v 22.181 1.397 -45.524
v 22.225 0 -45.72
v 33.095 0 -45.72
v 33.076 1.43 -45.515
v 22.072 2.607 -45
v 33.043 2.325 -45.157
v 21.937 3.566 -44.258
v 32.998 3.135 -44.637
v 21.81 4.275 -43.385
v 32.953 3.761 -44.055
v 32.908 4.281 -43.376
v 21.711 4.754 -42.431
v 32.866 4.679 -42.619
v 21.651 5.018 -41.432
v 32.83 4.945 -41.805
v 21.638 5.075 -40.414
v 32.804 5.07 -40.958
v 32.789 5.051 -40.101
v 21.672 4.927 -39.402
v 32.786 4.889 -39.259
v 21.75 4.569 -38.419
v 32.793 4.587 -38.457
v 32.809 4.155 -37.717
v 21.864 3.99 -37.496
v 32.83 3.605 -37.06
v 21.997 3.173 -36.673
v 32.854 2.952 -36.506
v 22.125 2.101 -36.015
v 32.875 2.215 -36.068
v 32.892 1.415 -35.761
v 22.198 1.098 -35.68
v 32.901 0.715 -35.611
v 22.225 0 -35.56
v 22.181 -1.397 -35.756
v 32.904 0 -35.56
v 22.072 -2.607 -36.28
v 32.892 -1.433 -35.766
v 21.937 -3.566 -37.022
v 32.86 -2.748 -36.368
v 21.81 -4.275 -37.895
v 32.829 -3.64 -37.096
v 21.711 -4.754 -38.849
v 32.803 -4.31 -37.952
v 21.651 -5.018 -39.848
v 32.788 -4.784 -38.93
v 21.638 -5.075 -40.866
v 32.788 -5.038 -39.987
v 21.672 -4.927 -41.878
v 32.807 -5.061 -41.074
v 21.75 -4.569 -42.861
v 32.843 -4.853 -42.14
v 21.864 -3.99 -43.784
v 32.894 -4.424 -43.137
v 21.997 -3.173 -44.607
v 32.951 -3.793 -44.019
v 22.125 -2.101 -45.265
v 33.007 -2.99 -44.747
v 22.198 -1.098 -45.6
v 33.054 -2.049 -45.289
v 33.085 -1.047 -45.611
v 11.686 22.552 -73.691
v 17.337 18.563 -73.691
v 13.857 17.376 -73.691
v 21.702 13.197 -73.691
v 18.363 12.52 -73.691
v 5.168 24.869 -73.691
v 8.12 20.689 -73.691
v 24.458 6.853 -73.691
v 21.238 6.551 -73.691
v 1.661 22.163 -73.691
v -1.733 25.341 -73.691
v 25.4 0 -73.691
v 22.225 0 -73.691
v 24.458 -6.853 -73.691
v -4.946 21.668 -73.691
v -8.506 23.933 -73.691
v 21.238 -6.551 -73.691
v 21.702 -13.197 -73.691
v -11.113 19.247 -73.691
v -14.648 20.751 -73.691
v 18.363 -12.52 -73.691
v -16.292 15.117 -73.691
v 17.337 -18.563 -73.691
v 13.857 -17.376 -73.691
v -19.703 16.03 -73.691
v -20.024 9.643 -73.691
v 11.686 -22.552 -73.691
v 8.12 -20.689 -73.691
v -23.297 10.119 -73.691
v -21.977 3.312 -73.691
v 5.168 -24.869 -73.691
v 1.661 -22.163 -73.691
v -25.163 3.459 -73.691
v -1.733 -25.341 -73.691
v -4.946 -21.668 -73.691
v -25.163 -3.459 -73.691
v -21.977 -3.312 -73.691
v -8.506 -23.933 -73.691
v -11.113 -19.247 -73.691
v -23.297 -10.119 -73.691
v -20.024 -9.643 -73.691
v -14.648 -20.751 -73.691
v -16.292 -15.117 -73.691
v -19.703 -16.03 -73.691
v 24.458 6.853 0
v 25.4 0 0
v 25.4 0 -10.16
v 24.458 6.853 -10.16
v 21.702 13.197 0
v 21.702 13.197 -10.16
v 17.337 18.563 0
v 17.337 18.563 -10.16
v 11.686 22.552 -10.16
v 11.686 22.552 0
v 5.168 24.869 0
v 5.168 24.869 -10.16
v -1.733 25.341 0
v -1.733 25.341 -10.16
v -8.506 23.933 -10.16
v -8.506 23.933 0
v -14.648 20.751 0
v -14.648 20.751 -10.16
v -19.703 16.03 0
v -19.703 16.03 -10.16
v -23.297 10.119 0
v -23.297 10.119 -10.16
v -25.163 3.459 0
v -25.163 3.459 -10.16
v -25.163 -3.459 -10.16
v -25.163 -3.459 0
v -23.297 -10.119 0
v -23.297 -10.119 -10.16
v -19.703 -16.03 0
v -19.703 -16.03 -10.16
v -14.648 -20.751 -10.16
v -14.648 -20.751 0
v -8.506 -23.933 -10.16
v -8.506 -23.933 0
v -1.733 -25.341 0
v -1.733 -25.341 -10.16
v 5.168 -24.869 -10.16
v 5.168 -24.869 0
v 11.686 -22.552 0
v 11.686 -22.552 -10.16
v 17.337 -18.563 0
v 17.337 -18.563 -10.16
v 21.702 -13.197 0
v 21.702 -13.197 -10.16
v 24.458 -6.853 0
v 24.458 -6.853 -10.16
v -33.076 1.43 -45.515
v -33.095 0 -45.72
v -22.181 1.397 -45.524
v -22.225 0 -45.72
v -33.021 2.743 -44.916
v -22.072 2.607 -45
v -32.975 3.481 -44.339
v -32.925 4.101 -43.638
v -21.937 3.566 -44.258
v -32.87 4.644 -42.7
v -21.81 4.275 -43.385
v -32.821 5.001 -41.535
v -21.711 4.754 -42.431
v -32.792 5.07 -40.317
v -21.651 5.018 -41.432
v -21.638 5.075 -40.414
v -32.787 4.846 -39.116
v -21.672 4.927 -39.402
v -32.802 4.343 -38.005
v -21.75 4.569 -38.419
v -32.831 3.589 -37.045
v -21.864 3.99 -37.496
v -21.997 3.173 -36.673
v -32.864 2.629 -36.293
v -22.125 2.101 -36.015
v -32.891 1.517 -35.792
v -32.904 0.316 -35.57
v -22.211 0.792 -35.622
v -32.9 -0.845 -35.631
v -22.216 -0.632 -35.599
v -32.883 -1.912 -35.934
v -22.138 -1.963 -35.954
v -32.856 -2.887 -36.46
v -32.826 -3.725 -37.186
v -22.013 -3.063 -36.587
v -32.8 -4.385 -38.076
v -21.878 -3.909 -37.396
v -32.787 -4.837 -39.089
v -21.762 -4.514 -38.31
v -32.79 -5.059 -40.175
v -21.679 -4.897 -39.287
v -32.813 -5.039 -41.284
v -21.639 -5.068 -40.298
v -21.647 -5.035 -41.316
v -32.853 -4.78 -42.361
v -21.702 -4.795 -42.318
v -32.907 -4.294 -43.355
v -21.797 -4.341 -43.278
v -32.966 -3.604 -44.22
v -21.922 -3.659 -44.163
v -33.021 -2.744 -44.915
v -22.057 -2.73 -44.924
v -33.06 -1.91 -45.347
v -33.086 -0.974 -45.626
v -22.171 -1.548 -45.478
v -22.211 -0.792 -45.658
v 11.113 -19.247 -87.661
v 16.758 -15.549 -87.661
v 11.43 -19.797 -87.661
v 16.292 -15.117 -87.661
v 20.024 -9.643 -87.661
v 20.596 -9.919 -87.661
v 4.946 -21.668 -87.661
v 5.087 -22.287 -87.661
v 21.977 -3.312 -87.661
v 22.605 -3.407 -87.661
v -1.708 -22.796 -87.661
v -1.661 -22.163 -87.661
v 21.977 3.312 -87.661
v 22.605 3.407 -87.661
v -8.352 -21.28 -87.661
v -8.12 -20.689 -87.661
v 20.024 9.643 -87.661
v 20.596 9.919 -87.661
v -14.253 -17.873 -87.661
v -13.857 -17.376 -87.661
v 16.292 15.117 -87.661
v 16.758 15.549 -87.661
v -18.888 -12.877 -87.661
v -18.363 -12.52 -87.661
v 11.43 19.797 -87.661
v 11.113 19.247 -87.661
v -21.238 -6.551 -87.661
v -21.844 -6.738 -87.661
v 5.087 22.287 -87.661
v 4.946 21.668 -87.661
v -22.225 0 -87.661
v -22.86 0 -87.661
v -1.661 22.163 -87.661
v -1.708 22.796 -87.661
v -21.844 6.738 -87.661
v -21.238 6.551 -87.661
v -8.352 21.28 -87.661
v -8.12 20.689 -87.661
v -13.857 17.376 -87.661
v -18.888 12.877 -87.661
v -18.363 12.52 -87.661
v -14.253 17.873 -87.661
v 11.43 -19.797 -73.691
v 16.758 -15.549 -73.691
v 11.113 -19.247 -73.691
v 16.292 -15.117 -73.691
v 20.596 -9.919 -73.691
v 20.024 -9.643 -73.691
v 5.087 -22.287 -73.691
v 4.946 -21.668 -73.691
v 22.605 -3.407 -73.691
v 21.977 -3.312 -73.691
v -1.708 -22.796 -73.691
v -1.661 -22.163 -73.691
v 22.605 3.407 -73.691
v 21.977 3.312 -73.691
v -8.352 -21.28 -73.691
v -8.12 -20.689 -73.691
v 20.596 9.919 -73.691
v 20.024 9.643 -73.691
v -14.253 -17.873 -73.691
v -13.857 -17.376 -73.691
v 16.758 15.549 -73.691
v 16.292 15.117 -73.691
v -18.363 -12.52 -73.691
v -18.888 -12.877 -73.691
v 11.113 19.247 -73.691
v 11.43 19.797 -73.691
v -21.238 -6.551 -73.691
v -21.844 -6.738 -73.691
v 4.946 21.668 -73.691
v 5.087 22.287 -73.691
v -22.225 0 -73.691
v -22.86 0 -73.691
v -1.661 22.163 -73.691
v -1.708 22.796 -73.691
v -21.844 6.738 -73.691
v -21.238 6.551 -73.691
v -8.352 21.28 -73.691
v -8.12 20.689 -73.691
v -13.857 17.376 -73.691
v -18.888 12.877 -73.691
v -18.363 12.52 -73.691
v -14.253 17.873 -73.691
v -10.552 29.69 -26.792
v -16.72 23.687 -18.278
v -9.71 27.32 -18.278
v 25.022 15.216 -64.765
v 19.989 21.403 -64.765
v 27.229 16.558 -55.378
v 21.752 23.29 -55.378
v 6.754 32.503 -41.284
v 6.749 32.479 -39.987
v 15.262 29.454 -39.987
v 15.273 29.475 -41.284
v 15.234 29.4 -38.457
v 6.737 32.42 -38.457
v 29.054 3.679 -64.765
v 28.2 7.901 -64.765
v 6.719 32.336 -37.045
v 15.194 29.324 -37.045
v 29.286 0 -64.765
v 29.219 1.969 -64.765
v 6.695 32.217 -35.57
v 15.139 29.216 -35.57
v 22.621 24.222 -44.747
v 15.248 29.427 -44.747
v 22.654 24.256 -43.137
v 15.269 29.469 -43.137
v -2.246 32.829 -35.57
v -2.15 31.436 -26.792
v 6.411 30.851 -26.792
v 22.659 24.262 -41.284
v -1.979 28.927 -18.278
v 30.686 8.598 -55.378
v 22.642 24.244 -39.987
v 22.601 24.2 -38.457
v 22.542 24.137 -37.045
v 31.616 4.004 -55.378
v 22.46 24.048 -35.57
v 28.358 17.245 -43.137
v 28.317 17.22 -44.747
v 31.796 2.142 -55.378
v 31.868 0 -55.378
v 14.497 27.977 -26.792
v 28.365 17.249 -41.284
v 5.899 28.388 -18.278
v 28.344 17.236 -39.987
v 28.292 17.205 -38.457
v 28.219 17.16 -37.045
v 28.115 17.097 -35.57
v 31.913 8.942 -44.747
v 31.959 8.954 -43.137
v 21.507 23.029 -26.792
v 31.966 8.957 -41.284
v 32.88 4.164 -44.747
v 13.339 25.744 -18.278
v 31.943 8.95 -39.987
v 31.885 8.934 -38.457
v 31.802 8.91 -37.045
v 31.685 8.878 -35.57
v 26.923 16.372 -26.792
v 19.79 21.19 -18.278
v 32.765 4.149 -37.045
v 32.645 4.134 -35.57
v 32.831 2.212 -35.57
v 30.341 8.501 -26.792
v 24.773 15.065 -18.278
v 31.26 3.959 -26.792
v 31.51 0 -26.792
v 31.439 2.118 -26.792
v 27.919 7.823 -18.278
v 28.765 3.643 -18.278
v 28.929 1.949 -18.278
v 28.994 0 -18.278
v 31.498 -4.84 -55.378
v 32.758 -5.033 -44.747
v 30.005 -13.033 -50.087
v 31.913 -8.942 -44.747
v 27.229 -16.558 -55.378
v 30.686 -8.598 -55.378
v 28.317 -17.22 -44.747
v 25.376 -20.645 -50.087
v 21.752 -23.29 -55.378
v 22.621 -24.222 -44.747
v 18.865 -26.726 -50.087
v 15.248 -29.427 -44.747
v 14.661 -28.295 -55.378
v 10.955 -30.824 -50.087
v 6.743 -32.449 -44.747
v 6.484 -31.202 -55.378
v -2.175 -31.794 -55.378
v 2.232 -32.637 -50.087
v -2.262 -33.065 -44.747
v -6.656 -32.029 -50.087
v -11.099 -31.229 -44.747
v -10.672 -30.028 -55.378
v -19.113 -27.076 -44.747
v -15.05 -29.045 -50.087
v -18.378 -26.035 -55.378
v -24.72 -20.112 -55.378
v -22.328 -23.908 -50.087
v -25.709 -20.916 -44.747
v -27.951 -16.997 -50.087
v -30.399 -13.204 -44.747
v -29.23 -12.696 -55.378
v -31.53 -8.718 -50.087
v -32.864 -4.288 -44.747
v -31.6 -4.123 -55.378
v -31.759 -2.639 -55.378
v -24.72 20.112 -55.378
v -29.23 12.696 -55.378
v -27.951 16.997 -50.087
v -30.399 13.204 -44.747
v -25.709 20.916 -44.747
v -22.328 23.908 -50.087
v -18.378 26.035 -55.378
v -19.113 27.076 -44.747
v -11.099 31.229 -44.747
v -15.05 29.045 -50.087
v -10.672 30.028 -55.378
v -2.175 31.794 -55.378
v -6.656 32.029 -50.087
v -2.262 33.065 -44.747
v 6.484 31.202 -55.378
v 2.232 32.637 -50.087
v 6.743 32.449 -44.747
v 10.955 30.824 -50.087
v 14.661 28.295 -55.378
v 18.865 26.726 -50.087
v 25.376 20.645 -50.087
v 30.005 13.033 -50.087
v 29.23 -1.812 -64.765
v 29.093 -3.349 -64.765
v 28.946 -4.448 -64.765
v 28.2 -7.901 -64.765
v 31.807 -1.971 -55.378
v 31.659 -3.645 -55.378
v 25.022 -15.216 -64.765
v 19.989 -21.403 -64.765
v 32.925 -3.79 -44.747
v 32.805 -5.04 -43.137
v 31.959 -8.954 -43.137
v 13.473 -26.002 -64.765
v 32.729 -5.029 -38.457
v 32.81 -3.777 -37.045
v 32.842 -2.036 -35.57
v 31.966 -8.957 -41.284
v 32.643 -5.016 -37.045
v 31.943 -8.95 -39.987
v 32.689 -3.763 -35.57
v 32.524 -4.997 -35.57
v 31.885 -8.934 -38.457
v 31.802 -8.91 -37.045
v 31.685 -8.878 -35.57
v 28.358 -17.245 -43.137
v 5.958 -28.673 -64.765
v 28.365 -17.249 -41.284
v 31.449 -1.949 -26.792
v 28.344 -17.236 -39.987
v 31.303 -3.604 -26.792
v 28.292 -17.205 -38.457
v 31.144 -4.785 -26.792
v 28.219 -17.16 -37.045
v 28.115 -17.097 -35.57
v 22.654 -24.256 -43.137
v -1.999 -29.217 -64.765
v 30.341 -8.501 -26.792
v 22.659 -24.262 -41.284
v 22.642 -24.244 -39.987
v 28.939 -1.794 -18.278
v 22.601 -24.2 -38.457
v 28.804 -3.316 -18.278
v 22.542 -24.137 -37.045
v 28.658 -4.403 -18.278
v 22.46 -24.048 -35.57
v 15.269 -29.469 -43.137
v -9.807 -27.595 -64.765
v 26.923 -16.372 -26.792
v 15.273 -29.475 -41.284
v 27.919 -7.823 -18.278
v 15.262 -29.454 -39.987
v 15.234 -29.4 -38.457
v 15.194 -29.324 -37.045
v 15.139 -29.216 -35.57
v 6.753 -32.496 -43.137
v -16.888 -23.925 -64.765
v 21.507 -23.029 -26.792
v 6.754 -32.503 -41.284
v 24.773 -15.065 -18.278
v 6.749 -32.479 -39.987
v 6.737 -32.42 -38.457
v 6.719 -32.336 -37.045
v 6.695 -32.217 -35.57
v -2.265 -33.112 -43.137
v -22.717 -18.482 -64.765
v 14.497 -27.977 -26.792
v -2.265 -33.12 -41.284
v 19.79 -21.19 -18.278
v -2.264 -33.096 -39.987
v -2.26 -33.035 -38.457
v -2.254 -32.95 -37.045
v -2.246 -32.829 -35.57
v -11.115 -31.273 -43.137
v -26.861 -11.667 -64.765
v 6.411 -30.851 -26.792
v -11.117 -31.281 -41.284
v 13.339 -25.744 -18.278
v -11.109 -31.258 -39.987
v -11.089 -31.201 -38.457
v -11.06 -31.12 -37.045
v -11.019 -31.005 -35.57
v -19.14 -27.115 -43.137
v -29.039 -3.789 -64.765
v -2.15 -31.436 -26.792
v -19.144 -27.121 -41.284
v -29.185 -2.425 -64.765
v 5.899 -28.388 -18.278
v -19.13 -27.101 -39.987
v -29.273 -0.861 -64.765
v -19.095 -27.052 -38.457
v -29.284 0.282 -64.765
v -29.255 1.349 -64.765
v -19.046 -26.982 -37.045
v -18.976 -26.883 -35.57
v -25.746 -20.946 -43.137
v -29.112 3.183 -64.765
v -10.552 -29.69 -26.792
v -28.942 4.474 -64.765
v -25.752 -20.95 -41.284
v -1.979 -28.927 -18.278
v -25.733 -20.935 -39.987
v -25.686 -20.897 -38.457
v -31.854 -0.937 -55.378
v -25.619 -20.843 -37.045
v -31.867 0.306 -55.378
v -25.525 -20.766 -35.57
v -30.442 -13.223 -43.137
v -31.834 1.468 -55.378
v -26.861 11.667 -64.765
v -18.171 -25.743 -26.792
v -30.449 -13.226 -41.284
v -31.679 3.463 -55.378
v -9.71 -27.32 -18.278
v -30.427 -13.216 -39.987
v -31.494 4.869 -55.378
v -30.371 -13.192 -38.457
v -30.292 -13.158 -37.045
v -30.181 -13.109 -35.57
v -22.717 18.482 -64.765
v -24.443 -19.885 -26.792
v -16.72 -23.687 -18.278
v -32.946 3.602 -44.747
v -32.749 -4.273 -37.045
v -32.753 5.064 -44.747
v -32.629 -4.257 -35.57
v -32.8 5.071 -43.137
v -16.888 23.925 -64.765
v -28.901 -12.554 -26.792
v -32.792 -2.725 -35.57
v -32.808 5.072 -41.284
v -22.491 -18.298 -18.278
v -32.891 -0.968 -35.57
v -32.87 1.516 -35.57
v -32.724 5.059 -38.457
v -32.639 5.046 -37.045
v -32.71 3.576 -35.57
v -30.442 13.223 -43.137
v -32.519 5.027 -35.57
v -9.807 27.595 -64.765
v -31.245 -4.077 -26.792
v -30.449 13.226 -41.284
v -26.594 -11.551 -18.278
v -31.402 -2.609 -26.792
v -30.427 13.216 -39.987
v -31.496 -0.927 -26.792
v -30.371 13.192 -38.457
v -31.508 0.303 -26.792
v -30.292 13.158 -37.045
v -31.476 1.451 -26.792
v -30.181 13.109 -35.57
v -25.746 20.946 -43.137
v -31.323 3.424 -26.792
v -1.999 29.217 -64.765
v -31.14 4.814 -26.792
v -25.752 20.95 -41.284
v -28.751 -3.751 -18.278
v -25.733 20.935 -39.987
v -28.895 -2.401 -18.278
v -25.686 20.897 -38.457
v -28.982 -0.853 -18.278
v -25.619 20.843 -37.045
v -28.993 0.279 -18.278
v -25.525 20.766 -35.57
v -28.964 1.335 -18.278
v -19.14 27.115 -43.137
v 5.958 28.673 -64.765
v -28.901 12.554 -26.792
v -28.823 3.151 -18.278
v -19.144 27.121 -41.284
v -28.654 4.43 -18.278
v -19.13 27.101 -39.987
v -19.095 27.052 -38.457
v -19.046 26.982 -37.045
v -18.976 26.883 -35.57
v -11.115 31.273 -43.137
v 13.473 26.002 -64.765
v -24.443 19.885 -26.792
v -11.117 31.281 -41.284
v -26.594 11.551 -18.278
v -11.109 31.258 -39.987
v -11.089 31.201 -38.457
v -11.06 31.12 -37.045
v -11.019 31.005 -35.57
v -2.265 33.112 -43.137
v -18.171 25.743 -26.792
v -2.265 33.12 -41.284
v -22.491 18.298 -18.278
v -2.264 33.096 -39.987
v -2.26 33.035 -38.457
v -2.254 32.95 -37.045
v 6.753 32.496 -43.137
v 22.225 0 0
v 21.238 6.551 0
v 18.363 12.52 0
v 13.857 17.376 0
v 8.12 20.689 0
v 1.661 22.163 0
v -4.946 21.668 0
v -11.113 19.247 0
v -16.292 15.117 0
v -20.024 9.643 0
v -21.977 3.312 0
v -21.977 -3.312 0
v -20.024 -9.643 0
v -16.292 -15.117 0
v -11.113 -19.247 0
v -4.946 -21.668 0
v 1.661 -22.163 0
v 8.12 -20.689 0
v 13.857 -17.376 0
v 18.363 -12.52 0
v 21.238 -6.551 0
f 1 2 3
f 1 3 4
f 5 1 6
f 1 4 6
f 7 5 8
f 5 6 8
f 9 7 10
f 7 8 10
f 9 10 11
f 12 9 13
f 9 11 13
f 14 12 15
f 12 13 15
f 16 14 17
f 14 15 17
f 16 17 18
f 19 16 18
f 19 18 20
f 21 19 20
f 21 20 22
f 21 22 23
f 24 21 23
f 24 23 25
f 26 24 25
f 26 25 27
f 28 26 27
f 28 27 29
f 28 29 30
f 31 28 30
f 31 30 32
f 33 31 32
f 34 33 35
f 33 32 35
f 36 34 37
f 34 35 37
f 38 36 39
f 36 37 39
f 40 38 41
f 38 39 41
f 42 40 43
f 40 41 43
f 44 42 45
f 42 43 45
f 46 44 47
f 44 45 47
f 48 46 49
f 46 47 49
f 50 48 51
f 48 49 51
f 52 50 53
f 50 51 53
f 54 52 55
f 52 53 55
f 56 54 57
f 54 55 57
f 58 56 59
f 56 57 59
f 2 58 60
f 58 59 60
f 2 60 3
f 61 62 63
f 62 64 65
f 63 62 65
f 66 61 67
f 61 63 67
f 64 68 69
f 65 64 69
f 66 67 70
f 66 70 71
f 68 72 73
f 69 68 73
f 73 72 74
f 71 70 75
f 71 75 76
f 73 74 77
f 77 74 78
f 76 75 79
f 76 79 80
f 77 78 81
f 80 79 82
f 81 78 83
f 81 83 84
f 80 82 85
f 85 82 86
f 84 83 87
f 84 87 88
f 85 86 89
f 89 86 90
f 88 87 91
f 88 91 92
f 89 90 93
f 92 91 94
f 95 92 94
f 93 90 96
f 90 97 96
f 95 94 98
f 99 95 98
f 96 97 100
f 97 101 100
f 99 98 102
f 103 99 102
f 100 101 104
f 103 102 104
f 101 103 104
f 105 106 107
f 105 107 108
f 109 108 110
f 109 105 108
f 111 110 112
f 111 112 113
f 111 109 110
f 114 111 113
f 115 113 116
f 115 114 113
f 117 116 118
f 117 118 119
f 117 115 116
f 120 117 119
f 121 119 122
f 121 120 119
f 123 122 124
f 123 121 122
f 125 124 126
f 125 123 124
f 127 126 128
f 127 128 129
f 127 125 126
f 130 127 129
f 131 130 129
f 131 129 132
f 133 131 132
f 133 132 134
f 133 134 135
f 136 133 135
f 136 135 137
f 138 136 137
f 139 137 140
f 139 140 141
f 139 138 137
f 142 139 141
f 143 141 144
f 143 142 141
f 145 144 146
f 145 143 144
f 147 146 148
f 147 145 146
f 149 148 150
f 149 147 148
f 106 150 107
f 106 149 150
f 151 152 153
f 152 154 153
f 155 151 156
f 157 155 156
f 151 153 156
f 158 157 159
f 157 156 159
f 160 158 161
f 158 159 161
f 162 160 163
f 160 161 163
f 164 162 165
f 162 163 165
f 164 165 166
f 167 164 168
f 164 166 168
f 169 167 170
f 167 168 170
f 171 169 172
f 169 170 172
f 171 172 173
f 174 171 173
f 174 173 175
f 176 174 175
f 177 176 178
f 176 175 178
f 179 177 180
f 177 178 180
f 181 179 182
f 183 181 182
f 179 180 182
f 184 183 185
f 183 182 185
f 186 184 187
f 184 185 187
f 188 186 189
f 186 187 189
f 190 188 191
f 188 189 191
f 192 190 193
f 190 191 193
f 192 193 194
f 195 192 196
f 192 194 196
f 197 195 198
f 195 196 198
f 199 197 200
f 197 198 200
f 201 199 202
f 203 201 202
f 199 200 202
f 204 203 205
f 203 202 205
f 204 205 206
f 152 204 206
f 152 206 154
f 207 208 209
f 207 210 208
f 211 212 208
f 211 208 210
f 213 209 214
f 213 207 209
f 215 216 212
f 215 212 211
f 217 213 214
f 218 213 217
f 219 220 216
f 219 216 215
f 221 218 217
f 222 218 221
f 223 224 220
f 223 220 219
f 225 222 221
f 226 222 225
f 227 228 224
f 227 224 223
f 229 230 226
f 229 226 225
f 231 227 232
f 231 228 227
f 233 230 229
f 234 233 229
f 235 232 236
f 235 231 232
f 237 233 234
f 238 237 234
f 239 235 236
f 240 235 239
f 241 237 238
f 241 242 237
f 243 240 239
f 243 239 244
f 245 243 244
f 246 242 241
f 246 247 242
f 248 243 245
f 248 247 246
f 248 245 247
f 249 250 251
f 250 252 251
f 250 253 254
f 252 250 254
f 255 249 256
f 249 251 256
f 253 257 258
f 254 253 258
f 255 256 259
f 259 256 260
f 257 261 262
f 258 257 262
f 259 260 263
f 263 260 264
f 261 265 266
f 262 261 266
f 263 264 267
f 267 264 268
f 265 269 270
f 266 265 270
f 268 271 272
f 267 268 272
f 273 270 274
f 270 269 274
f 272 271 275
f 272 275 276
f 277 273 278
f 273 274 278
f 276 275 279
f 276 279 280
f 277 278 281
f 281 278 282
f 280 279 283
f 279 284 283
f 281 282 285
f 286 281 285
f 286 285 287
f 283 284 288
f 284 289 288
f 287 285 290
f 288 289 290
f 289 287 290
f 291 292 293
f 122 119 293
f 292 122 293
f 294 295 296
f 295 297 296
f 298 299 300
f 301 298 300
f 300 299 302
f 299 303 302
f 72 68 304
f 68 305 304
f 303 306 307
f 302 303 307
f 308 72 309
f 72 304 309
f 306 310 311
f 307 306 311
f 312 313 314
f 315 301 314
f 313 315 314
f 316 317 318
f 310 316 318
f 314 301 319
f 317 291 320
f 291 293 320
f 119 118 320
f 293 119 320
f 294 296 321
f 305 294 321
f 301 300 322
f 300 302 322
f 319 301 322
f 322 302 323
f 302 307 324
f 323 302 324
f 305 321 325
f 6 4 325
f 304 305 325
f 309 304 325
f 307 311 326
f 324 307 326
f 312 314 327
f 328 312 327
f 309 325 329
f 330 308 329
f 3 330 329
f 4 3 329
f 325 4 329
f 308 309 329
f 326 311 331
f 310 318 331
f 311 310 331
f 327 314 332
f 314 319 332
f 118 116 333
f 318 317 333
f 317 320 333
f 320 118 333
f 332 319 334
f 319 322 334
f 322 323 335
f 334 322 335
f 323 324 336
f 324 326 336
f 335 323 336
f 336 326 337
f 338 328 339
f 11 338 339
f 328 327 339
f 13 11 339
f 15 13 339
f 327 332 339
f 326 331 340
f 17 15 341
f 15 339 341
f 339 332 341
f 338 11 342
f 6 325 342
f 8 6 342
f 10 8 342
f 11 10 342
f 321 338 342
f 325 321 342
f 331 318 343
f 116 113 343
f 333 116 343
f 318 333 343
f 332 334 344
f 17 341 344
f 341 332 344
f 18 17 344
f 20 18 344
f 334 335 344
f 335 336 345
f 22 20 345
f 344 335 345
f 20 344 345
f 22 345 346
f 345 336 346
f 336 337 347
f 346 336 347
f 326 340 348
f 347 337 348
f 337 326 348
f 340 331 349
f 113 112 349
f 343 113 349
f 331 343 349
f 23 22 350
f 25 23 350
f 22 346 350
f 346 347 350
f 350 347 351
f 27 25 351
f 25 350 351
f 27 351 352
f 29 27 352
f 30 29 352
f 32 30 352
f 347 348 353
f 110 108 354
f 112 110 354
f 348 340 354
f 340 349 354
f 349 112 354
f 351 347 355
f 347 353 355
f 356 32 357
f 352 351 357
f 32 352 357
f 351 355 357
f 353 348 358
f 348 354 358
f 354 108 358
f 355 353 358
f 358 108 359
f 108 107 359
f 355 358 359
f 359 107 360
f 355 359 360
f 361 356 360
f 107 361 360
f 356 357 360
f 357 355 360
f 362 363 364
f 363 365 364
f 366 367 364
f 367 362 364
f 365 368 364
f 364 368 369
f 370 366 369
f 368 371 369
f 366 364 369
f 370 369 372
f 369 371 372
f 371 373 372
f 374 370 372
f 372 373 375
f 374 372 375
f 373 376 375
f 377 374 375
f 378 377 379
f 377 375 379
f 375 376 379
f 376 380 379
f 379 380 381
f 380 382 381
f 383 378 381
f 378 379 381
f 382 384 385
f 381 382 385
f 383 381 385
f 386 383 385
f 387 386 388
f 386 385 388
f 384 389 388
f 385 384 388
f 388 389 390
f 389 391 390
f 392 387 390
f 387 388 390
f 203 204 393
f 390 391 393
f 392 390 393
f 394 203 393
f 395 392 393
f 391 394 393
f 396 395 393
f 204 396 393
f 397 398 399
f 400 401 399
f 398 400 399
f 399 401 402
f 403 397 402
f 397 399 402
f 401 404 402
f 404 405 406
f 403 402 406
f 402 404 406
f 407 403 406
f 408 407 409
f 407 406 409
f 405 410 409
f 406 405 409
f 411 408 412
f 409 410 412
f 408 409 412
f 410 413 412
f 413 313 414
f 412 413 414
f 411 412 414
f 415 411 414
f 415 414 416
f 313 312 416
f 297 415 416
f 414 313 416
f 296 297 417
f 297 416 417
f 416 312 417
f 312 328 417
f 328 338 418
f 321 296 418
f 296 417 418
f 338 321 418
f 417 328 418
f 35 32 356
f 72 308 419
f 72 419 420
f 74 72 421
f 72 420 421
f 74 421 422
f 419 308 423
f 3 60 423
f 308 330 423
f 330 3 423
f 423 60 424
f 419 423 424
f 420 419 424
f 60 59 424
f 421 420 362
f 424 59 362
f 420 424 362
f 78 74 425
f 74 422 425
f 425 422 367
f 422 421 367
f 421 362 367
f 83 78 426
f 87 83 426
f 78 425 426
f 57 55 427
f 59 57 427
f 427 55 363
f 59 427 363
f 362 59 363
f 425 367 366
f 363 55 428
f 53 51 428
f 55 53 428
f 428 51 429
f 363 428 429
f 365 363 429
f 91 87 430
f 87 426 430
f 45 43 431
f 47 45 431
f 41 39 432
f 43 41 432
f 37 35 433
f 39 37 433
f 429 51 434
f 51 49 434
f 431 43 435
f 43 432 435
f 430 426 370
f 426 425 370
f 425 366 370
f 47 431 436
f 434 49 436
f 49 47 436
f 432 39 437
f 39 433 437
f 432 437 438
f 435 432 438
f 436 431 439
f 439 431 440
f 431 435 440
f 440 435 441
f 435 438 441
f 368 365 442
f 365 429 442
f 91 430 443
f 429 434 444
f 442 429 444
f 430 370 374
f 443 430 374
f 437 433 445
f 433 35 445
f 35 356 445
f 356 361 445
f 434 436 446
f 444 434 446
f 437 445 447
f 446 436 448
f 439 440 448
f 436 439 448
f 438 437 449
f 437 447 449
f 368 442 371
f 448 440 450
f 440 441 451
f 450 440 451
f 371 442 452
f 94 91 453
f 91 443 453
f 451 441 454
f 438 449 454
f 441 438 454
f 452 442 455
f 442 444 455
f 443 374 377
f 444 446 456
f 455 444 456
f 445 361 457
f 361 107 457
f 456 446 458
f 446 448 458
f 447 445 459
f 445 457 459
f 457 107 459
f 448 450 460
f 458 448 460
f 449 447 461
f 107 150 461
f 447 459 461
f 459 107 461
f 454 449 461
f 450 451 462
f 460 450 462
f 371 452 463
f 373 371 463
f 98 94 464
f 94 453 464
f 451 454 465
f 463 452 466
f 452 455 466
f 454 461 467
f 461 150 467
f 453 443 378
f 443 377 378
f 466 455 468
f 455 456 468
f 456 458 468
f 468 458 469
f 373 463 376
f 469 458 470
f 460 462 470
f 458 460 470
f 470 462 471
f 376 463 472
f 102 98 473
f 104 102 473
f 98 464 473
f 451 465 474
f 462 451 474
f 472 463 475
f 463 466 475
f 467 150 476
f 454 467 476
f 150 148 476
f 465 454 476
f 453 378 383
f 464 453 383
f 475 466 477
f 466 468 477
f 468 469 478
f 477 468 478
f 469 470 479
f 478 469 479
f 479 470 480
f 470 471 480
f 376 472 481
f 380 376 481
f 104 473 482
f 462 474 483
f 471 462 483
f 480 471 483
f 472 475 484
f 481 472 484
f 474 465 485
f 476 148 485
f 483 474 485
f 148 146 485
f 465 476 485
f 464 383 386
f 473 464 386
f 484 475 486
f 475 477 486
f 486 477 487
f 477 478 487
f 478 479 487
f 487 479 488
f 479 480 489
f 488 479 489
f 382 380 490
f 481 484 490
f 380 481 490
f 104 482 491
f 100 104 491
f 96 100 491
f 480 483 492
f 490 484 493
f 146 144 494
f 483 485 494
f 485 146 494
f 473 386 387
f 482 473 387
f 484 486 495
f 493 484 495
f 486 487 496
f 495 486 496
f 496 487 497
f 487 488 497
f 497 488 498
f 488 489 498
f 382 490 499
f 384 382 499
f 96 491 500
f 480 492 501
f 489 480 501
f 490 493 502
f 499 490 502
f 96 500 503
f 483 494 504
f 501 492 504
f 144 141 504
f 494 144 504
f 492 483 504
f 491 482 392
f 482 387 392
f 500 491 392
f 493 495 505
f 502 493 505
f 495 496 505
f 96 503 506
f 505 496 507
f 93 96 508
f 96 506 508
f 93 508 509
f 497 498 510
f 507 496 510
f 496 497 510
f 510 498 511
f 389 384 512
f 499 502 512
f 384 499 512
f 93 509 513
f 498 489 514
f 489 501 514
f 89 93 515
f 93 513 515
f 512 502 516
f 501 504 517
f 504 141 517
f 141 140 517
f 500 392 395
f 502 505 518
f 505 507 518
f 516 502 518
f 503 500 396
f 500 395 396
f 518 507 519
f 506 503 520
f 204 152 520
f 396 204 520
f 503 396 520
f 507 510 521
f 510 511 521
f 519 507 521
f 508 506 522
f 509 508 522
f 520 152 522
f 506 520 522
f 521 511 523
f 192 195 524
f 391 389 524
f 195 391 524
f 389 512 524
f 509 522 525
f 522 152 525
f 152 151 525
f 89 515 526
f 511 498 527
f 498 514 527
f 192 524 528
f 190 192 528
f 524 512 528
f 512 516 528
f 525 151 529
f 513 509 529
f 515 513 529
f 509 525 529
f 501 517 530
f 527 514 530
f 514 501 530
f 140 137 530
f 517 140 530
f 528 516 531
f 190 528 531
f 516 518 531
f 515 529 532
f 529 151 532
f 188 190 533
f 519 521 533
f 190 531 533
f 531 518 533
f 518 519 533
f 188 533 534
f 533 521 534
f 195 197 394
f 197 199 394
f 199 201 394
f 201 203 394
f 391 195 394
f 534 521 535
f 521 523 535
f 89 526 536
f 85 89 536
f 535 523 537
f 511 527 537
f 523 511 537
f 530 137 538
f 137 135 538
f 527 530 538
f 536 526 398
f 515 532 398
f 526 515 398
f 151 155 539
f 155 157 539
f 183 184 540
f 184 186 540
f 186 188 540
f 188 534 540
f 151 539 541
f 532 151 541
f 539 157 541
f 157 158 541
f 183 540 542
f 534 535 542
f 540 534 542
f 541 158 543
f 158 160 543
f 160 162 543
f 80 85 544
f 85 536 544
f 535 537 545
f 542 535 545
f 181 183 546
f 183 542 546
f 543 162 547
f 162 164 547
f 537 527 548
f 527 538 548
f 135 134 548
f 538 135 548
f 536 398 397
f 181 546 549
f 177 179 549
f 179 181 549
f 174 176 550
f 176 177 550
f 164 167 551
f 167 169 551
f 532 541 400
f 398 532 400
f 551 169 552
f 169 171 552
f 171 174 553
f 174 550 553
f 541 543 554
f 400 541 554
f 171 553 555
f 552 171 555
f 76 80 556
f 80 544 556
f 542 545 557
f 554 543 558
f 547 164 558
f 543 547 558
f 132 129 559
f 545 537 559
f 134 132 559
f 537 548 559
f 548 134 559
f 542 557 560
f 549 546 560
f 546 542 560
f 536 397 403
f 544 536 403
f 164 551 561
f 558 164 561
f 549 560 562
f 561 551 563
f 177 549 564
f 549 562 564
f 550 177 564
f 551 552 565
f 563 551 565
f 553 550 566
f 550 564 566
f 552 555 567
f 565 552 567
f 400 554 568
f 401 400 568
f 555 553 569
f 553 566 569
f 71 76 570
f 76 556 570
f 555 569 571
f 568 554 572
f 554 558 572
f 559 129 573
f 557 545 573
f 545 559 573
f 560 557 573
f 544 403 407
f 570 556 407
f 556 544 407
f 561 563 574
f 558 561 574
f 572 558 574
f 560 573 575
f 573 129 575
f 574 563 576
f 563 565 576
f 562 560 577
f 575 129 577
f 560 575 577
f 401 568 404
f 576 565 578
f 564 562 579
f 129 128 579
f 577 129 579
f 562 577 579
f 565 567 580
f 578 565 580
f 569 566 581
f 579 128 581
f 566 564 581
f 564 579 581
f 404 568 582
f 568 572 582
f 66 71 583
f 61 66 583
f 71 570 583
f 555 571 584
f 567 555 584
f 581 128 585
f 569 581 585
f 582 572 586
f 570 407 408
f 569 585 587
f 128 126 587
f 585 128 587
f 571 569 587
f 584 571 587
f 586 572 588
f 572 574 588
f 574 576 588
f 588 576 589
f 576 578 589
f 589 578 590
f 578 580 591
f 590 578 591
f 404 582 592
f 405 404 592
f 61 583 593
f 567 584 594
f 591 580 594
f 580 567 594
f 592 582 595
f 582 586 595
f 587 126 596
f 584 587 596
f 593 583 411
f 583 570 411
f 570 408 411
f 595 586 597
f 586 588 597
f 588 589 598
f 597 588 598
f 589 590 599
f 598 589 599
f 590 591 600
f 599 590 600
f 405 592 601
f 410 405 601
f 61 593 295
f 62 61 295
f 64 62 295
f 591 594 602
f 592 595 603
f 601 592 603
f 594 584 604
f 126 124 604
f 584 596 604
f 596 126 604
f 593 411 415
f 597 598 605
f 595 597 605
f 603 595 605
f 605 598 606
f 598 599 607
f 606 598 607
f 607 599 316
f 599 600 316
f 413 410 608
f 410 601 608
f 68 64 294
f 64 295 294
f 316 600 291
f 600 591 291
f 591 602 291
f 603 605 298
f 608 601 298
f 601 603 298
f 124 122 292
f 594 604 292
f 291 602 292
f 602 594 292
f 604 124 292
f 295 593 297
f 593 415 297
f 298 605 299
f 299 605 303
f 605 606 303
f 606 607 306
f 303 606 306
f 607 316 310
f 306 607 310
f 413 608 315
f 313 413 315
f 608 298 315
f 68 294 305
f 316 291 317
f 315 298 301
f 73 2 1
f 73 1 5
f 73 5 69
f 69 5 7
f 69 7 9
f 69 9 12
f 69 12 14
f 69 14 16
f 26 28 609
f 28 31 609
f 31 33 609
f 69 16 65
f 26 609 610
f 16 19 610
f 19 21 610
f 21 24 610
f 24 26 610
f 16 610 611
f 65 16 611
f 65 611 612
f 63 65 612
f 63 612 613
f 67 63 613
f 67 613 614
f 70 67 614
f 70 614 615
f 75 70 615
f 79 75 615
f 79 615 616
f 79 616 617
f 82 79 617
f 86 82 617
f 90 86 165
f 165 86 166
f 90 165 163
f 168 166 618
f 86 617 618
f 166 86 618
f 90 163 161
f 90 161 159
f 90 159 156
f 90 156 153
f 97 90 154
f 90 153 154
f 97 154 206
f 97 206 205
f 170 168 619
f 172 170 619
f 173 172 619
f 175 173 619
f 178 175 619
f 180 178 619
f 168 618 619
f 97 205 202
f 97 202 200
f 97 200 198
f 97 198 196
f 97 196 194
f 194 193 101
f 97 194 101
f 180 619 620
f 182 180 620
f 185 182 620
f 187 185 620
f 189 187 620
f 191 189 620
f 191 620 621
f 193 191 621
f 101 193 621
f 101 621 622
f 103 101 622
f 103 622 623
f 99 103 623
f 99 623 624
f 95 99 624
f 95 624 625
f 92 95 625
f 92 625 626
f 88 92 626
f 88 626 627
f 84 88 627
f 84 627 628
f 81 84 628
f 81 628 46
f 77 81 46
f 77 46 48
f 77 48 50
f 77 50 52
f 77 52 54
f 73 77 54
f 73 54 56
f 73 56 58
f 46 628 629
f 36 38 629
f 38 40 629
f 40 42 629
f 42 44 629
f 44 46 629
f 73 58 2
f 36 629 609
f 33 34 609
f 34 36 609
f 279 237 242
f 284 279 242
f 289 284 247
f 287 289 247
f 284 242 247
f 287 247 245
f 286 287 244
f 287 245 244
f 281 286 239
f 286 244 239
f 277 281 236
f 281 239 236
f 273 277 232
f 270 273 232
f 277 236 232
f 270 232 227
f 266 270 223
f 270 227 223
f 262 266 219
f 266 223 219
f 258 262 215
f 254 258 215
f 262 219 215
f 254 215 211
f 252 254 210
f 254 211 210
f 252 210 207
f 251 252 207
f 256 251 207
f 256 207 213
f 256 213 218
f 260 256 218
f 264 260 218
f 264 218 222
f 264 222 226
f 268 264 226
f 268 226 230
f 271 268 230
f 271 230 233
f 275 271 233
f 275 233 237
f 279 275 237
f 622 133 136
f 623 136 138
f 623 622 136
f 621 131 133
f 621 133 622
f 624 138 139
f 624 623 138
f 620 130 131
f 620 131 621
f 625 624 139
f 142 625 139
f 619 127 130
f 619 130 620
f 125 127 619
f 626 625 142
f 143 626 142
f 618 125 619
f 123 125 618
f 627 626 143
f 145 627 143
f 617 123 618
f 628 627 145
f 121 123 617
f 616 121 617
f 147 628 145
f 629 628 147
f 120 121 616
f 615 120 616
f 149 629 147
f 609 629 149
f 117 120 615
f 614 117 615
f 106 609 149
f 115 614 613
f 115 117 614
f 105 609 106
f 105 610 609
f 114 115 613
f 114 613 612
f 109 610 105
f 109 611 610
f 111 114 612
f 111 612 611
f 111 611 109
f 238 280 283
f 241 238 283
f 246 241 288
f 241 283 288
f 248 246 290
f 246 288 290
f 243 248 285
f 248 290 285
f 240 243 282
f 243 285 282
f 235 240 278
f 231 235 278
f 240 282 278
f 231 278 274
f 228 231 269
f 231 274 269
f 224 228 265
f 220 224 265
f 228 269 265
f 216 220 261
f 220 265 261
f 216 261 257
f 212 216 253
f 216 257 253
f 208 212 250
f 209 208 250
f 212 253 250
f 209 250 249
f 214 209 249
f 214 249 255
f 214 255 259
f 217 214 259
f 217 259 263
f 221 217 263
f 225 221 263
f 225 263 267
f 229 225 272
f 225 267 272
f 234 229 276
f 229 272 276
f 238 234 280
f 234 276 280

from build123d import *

# Parameters (mm, degrees)
SKETCH1_R           = 25.4
BOSS_EXTRUDE1_DEPTH = 10.16
SKETCH4_R           = 22.225
CUT_EXTRUDE1_DEPTH  = 88.378237328
SKETCH5_R           = 22.86
BOSS_EXTRUDE2_DEPTH = 13.97
SKETCH6_R           = 22.225
CUT_EXTRUDE2_DEPTH  = 100.443725613
SKETCH7_R           = 5.08
CUT_EXTRUDE3_DEPTH  = 127


with BuildPart() as part:
    # Sketch1 → Boss-Extrude1 (new body)
    with BuildSketch(Plane.XY):
        Circle(SKETCH1_R)
    extrude(amount=-BOSS_EXTRUDE1_DEPTH)

    # Sketch3 → Revolve1 (revolve)
    with BuildSketch(Plane(origin=(0, 0, 0), x_dir=(0, 0, -1), z_dir=(1, 0, 0)), mode=Mode.PRIVATE) as revolve1_sk:
        with BuildLine():
            Line((10.16, 25.4), (10.16, 0))
            Line((10.16, 0), (73.691385827, 0))
            Line((73.691385827, 0), (73.691385827, 25.4))
            ThreePointArc((73.691385827, 25.4), (41.925692914, 33.200421573), (10.16, 25.4))
        make_face()
    revolve(revolve1_sk.sketch.rotate(Axis((0, 0, 91.444386702), (0, 0, -1)), 90), axis=Axis((0, 0, 91.444386702), (0, 0, -1)))

    # Sketch4 → Cut-Extrude1 (cut, through all)
    with BuildSketch(Plane.XY):
        Circle(SKETCH4_R)
    extrude(amount=-CUT_EXTRUDE1_DEPTH, mode=Mode.SUBTRACT)

    # Sketch7 → Cut-Extrude3 (cut, symmetric)
    with BuildSketch(Plane(origin=(0, 0, 0), x_dir=(0, 0, -1), z_dir=(1, 0, 0))):
        with Locations((40.64, 0)):
            Circle(SKETCH7_R)
    extrude(amount=CUT_EXTRUDE3_DEPTH, both=True, mode=Mode.SUBTRACT)


with BuildPart() as body_2:
    # Sketch5 → Boss-Extrude2 (new body)
    with BuildSketch(Plane(origin=(0, 0, -73.691385827), x_dir=(-1, 0, 0), z_dir=(0, 0, -1))):
        Circle(SKETCH5_R)
    extrude(amount=BOSS_EXTRUDE2_DEPTH)

    # Sketch6 → Cut-Extrude2 (cut, through all)
    with BuildSketch(Plane(origin=(0, 0, -87.661385827), x_dir=(-1, 0, 0), z_dir=(0, 0, -1))):
        Circle(SKETCH6_R)
    extrude(amount=-CUT_EXTRUDE2_DEPTH, mode=Mode.SUBTRACT)


solid = Compound([part.part, body_2.part])
